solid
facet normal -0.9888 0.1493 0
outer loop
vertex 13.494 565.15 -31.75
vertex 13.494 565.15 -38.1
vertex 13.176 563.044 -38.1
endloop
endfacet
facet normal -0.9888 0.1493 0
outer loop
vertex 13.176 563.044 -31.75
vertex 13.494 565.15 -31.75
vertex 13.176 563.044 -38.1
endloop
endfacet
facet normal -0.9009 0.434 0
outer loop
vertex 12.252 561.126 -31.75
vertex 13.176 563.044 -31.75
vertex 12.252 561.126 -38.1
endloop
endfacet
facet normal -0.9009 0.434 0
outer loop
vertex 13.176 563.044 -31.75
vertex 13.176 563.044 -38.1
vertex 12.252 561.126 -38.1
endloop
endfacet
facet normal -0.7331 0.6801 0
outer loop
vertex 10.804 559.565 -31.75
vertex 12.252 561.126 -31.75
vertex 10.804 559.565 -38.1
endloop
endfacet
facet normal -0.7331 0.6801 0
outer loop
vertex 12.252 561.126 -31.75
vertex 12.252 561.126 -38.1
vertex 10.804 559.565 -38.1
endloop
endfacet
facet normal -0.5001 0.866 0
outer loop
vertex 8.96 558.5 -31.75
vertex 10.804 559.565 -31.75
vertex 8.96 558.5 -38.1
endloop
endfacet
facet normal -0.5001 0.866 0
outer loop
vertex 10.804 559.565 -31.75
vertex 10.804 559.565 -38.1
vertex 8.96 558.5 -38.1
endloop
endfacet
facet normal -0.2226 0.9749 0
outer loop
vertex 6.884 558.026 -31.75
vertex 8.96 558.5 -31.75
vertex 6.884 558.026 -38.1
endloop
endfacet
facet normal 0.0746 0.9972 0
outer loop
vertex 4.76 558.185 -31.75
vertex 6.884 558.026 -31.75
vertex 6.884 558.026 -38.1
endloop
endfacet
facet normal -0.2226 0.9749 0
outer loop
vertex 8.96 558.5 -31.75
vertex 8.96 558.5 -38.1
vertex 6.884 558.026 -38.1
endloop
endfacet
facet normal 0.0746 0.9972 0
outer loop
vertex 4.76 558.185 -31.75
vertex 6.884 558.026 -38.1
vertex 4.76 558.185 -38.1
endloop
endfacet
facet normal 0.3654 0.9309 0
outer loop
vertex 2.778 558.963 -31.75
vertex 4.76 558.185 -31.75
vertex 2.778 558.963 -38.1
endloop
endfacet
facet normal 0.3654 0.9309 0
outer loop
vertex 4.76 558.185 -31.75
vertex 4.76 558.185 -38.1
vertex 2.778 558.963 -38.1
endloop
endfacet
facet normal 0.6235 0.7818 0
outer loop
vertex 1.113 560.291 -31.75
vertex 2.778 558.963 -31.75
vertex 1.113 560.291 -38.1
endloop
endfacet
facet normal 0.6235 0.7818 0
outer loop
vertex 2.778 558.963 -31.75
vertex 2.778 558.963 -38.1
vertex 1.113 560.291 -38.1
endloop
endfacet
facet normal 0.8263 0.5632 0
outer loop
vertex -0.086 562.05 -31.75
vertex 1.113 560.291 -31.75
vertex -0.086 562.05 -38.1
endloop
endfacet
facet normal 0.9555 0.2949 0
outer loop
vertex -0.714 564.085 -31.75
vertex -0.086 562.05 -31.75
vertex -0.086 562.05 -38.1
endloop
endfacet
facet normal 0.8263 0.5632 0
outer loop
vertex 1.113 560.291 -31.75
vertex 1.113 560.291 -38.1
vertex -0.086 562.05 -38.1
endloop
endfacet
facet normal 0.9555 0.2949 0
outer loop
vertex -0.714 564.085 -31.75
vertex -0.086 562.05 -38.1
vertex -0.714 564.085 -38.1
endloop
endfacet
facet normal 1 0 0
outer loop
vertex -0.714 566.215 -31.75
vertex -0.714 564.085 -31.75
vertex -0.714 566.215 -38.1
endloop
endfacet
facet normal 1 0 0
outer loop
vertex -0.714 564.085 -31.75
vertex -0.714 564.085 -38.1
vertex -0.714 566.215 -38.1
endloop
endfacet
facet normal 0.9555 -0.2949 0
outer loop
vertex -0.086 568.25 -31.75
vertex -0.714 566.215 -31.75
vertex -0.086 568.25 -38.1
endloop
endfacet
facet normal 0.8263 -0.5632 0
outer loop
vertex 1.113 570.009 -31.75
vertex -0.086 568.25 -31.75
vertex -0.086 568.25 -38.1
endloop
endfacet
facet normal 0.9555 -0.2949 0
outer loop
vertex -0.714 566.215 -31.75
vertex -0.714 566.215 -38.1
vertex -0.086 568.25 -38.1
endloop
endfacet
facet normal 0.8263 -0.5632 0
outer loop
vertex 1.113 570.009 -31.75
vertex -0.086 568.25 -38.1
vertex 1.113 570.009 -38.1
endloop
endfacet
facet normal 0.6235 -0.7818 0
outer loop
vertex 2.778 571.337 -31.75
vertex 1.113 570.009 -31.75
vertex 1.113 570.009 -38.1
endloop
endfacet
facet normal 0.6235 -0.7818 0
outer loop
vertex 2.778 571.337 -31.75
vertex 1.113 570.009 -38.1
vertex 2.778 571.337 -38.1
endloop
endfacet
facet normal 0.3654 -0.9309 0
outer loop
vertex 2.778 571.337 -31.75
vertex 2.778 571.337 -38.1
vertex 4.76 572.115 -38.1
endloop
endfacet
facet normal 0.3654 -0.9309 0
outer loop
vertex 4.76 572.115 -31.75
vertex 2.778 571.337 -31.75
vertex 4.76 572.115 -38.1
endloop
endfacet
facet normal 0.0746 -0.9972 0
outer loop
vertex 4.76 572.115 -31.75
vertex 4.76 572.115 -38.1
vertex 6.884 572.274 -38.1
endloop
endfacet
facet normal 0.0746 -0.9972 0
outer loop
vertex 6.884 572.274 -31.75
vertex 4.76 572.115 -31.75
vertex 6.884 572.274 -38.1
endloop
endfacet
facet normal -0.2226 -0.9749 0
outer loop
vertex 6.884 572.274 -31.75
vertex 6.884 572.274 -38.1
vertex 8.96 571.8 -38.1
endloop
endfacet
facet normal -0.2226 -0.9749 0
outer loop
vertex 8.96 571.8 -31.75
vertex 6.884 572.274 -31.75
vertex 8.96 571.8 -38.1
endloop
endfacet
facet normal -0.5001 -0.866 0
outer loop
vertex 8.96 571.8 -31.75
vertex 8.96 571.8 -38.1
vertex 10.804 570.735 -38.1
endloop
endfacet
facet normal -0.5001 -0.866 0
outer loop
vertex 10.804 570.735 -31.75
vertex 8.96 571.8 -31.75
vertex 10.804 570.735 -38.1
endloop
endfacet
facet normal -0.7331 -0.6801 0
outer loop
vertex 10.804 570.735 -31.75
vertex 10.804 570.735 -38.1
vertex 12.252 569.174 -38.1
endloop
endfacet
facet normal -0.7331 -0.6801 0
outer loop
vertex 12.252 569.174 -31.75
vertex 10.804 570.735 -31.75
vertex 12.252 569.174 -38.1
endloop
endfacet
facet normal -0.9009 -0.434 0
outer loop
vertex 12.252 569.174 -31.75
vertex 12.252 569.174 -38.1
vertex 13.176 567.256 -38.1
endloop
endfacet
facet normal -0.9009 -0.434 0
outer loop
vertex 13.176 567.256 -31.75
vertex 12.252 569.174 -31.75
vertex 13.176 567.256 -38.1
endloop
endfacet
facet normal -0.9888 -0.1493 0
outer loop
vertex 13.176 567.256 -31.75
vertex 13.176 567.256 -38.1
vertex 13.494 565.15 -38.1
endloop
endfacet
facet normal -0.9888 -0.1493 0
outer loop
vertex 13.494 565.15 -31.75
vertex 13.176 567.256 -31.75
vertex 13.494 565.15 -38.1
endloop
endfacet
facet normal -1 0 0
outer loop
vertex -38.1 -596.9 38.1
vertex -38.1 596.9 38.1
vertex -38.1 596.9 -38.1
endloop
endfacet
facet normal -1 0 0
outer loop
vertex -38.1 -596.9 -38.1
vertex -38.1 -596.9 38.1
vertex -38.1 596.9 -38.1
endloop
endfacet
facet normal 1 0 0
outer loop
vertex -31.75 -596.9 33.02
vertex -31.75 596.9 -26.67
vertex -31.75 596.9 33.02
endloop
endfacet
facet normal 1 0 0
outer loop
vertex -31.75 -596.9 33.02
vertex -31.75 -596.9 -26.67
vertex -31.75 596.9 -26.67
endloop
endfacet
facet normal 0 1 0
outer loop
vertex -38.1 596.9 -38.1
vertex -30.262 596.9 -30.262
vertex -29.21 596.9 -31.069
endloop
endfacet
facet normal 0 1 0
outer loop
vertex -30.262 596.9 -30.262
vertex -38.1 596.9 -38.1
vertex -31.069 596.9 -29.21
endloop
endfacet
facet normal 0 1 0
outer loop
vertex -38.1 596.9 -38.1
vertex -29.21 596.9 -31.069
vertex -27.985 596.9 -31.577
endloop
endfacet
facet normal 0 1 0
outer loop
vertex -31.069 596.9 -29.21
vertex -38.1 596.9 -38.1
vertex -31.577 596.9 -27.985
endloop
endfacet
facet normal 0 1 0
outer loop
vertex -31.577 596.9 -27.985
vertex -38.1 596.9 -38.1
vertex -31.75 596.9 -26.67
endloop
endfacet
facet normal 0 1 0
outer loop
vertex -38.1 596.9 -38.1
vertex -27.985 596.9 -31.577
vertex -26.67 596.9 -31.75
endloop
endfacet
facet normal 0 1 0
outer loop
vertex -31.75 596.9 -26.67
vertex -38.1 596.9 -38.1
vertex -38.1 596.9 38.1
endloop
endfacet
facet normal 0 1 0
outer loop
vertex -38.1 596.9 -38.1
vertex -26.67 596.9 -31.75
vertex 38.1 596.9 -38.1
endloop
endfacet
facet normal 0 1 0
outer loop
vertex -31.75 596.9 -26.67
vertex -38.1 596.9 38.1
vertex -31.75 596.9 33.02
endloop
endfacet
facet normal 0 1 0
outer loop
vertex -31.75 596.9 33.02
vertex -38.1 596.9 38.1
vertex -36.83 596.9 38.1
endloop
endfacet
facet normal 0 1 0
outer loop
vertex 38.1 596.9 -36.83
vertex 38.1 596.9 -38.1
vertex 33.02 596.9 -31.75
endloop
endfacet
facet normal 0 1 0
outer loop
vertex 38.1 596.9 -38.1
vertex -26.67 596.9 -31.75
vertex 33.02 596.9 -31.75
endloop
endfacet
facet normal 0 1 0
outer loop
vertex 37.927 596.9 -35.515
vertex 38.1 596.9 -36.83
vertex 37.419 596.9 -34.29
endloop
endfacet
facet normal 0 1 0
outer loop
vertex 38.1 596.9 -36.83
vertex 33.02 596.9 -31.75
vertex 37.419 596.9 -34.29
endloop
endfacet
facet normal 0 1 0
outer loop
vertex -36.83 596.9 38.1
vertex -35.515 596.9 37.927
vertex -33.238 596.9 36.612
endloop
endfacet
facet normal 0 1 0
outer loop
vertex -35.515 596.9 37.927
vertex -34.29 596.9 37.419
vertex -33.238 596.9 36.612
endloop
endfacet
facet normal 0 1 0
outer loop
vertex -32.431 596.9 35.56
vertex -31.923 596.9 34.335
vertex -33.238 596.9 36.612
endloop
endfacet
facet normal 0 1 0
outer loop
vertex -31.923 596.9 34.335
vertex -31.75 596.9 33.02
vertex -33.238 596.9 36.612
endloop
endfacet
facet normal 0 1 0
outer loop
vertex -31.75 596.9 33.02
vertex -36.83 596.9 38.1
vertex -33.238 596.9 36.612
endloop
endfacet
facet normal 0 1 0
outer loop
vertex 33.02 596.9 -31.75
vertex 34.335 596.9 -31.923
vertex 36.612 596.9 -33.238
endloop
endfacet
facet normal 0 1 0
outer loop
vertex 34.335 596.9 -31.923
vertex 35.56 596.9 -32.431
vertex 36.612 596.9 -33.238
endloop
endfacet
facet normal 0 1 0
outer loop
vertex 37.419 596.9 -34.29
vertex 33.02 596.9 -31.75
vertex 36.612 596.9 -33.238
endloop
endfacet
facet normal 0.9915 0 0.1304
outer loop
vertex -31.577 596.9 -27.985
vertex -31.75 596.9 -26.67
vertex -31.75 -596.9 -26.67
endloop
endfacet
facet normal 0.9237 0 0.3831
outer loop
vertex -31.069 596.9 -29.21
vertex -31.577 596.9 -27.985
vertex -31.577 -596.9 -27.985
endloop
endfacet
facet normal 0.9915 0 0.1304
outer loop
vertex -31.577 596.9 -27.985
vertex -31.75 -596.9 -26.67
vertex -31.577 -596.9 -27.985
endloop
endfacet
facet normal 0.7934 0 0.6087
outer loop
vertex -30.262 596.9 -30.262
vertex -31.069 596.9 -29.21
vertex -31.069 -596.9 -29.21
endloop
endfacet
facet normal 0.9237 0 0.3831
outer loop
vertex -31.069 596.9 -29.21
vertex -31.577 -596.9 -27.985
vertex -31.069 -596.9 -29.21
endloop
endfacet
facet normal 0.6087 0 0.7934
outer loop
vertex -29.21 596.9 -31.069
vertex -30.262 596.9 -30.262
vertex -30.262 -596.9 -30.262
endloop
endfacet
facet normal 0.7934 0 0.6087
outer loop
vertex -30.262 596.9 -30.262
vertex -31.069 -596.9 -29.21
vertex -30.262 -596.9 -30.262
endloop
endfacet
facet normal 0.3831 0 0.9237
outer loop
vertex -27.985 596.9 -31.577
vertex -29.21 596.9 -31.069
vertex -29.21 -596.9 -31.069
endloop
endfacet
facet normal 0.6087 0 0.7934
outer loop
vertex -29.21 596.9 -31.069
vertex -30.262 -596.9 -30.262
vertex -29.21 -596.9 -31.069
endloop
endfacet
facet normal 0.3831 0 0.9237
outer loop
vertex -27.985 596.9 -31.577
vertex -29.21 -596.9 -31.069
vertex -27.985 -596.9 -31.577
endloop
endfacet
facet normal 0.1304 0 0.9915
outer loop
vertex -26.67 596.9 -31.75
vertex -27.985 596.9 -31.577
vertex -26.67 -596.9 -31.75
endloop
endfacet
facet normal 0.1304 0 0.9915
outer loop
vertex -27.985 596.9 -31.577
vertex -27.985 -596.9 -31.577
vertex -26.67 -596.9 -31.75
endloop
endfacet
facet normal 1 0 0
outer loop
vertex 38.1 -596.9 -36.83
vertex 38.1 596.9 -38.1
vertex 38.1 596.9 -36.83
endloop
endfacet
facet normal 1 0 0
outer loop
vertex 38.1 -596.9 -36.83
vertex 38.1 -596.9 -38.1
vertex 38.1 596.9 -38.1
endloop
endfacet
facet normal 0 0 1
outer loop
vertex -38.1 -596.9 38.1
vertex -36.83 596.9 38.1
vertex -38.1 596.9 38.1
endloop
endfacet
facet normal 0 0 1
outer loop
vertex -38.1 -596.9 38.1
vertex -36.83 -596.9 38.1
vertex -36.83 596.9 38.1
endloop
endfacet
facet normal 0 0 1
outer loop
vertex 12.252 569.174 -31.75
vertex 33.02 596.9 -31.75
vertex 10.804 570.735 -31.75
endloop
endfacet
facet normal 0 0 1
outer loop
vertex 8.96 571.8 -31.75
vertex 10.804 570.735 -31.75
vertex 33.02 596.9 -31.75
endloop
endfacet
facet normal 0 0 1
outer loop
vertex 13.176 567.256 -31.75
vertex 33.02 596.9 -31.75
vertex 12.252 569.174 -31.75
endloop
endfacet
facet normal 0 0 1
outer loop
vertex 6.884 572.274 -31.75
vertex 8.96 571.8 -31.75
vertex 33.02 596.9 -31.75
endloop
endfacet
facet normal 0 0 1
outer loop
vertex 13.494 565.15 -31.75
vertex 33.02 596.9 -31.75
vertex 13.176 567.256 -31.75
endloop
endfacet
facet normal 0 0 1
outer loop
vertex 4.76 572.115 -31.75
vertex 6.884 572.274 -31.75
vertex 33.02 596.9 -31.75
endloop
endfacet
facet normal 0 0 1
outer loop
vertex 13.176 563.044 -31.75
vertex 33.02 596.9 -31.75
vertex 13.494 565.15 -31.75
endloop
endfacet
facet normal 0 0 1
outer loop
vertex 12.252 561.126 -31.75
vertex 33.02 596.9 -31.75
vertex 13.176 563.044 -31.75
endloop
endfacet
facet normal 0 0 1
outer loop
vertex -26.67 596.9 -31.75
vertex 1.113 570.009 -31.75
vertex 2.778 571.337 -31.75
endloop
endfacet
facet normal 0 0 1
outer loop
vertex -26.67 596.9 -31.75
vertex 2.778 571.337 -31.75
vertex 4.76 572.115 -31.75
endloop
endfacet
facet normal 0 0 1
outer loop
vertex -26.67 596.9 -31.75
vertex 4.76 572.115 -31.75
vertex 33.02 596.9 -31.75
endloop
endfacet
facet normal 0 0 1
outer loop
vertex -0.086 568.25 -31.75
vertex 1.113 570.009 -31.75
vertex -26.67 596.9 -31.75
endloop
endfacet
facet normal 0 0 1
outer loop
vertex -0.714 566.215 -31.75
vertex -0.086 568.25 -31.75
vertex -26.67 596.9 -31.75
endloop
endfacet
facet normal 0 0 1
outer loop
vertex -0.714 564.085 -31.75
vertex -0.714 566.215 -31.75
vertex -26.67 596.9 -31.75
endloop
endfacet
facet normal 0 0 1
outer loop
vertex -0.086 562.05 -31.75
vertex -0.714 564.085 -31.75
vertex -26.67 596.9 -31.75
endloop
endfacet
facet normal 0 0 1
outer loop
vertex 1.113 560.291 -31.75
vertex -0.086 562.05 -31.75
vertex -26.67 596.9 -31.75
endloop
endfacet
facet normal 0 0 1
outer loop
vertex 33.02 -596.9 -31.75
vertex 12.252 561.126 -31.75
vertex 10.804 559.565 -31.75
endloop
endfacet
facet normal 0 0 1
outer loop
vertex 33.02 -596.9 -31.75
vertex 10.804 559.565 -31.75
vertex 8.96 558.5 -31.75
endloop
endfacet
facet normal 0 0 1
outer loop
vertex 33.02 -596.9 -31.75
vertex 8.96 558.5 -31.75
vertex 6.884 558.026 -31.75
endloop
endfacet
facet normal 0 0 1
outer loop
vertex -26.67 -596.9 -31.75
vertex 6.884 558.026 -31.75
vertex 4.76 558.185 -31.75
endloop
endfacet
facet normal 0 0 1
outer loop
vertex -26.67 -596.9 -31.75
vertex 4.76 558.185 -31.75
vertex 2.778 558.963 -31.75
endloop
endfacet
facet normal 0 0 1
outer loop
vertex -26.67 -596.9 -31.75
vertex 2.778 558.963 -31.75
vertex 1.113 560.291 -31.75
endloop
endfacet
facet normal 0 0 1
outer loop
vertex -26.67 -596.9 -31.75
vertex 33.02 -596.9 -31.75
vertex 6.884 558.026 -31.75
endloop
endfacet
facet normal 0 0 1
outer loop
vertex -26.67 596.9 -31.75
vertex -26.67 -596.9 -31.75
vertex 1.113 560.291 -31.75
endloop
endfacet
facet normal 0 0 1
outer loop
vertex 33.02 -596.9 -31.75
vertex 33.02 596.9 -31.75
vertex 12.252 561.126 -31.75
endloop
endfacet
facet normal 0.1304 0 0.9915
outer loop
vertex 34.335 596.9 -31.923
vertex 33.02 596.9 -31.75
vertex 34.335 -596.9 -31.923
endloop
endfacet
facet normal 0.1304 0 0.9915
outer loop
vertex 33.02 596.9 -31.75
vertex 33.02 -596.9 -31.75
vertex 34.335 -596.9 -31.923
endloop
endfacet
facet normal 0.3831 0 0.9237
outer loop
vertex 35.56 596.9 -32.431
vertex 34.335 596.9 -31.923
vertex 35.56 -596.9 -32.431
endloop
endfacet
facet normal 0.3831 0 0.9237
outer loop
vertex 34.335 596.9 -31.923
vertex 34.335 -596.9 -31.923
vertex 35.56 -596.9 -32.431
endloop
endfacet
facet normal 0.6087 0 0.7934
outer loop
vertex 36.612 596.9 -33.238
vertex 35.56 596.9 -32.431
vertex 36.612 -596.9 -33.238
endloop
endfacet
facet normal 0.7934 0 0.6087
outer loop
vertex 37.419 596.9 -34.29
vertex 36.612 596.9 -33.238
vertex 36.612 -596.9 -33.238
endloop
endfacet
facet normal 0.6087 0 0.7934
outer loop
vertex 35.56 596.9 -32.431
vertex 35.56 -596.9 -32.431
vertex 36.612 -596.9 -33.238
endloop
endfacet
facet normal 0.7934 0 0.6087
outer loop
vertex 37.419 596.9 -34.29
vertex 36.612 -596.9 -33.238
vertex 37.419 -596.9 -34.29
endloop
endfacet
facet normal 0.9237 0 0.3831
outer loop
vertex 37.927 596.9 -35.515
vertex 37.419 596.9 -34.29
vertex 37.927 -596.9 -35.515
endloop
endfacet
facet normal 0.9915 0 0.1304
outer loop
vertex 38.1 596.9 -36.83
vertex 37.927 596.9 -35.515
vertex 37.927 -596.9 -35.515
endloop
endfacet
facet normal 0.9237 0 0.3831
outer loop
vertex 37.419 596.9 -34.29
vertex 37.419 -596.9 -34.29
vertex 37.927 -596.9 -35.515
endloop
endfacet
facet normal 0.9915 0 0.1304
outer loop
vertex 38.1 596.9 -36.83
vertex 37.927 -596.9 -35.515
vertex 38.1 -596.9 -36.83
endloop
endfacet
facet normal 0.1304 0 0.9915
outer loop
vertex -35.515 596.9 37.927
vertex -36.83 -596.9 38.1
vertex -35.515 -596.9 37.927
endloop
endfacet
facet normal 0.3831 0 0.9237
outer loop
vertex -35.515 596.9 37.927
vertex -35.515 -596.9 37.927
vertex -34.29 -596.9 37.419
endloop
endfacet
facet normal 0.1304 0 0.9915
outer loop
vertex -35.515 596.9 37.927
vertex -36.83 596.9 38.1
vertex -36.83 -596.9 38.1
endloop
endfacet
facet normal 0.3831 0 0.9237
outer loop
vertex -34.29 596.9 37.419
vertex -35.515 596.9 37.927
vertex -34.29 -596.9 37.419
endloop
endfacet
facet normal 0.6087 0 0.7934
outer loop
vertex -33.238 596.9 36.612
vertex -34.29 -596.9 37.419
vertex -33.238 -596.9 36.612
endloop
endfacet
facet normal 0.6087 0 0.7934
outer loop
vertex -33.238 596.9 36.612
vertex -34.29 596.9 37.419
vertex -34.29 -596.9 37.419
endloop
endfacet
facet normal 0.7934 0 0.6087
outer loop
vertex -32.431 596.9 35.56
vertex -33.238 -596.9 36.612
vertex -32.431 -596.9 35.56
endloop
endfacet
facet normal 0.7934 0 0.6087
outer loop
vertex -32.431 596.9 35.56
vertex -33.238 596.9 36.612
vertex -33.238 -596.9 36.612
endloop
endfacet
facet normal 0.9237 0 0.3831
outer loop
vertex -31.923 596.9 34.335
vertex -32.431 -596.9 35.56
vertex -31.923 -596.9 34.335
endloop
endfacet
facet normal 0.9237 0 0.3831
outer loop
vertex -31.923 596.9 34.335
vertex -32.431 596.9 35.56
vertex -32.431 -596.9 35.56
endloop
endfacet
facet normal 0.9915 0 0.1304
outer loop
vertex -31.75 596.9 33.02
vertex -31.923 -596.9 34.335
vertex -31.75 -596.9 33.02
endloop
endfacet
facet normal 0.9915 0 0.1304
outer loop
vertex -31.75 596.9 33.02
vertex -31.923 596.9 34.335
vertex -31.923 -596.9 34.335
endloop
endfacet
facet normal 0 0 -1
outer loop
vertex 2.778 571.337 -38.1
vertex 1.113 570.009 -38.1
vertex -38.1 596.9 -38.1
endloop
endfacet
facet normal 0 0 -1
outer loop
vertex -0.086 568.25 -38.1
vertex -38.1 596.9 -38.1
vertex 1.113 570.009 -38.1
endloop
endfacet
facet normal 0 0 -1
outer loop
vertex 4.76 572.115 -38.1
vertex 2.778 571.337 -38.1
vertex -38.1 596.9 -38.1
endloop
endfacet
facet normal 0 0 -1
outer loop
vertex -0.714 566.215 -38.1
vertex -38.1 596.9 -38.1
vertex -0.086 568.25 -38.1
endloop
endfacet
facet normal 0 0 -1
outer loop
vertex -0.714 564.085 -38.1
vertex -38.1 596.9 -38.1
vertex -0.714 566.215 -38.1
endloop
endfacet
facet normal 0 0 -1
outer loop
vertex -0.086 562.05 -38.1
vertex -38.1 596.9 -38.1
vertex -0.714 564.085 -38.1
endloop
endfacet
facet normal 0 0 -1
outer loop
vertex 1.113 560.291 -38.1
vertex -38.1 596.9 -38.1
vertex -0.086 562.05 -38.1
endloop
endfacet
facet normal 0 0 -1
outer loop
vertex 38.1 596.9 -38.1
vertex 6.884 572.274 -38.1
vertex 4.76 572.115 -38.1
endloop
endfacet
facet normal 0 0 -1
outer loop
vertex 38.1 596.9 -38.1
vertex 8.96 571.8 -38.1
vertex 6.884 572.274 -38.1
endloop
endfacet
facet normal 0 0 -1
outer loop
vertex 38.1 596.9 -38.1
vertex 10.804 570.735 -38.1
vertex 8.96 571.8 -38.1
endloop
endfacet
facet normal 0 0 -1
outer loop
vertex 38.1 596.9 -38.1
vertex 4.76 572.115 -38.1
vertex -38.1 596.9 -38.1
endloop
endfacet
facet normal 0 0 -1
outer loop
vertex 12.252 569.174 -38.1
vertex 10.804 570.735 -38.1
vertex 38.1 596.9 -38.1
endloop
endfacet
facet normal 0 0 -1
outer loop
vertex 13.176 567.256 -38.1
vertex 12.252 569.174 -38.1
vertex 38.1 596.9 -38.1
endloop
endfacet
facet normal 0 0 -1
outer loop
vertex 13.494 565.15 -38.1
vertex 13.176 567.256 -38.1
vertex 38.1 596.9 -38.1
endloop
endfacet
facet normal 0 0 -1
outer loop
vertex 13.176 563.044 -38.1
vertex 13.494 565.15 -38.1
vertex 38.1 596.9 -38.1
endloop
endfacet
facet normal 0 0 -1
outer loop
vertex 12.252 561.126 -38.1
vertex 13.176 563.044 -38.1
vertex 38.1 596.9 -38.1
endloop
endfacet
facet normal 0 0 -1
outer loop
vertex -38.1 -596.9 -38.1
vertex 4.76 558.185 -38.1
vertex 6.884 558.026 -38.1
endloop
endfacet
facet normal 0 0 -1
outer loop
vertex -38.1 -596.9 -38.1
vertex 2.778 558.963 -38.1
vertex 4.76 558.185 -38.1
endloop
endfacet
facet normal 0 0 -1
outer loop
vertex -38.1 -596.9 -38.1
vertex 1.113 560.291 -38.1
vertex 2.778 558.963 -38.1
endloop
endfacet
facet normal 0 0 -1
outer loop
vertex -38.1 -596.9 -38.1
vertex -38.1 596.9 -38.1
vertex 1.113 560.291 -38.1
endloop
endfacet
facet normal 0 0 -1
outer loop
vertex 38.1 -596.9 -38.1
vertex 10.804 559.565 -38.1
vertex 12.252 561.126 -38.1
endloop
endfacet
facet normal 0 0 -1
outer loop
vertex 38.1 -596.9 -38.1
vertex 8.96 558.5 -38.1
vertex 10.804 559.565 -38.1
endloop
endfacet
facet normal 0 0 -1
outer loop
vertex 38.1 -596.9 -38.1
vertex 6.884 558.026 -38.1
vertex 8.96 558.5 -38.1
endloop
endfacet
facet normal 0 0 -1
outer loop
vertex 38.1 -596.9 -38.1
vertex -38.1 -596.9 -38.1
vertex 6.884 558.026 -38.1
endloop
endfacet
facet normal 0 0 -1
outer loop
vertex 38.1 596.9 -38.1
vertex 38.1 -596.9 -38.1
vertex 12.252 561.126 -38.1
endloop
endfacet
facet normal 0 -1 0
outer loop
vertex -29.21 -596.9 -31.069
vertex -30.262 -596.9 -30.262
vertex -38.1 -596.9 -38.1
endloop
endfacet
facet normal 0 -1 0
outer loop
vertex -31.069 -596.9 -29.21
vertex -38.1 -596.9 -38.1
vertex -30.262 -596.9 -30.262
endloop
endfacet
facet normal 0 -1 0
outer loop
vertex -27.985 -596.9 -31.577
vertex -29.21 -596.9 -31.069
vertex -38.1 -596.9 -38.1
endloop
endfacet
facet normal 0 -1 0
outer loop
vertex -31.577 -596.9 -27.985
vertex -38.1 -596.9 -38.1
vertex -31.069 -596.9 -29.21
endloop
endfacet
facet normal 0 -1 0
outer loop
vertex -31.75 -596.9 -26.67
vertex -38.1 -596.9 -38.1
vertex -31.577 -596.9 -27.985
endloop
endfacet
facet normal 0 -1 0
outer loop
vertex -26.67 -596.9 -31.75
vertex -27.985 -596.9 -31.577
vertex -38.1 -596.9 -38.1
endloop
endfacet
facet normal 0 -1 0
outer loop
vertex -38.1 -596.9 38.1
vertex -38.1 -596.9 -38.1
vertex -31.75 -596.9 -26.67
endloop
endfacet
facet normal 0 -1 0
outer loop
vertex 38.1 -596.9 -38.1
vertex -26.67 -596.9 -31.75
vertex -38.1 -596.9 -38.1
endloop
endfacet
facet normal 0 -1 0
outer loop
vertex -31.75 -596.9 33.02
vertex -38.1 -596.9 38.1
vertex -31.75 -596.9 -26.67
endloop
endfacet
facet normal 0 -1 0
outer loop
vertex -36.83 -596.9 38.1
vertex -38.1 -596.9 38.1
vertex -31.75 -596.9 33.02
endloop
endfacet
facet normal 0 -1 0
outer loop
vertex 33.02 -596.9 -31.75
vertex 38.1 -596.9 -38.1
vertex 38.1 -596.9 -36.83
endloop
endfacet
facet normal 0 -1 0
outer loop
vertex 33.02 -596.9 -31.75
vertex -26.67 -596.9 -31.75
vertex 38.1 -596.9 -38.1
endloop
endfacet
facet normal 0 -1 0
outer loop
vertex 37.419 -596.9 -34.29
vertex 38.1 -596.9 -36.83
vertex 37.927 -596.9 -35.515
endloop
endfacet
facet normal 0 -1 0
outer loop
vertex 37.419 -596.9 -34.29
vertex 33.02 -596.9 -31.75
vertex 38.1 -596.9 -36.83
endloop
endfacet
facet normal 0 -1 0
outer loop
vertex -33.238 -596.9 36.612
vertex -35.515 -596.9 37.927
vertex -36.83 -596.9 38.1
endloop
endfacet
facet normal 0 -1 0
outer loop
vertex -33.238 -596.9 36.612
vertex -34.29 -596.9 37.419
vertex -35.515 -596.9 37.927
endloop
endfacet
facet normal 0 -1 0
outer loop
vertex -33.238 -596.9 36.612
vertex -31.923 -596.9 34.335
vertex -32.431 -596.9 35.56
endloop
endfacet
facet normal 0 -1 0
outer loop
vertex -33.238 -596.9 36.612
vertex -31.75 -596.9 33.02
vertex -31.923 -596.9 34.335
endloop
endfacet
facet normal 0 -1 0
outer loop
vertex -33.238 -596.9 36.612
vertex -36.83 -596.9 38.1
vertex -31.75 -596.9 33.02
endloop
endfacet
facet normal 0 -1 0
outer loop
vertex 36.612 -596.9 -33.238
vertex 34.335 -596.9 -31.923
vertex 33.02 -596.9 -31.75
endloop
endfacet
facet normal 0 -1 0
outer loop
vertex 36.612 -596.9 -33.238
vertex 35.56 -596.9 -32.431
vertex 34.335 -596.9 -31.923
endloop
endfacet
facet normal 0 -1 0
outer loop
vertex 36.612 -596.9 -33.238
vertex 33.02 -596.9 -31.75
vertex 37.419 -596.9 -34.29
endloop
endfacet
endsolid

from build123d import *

# Parameters (mm, degrees)
F1_DEPTH = 596.9
F2_R     = 5.08
F3_R     = 7.14375
F4_DEPTH = 25.4


with BuildPart() as f1:
    # F0 (on Front) → F1 (new body, symmetric)
    with BuildSketch(Plane.XZ):
        Polygon((-38.1, -38.1), (38.1, -38.1), (38.1, -31.75), (-31.75, -31.75), (-31.75, 38.1), (-38.1, 38.1), align=None)
    extrude(amount=F1_DEPTH, both=True)

    # F2
    f2_edges = [f1.edges().sort_by_distance(p)[0] for p in [
        (-31.75, 0, 38.1),
        (-31.75, 0, -31.75),
        (38.1, 0, -31.75),
    ]]
    fillet(f2_edges, radius=F2_R)

    # F3 (on face) → F4 (cut)
    with BuildSketch(Plane(origin=(0, 0, -38.1), x_dir=(1, 0, 0), z_dir=(0, 0, -1))):
        with Locations((6.35, -565.15)):
            Circle(F3_R)
    extrude(amount=-F4_DEPTH, mode=Mode.SUBTRACT)


solid = f1.part
